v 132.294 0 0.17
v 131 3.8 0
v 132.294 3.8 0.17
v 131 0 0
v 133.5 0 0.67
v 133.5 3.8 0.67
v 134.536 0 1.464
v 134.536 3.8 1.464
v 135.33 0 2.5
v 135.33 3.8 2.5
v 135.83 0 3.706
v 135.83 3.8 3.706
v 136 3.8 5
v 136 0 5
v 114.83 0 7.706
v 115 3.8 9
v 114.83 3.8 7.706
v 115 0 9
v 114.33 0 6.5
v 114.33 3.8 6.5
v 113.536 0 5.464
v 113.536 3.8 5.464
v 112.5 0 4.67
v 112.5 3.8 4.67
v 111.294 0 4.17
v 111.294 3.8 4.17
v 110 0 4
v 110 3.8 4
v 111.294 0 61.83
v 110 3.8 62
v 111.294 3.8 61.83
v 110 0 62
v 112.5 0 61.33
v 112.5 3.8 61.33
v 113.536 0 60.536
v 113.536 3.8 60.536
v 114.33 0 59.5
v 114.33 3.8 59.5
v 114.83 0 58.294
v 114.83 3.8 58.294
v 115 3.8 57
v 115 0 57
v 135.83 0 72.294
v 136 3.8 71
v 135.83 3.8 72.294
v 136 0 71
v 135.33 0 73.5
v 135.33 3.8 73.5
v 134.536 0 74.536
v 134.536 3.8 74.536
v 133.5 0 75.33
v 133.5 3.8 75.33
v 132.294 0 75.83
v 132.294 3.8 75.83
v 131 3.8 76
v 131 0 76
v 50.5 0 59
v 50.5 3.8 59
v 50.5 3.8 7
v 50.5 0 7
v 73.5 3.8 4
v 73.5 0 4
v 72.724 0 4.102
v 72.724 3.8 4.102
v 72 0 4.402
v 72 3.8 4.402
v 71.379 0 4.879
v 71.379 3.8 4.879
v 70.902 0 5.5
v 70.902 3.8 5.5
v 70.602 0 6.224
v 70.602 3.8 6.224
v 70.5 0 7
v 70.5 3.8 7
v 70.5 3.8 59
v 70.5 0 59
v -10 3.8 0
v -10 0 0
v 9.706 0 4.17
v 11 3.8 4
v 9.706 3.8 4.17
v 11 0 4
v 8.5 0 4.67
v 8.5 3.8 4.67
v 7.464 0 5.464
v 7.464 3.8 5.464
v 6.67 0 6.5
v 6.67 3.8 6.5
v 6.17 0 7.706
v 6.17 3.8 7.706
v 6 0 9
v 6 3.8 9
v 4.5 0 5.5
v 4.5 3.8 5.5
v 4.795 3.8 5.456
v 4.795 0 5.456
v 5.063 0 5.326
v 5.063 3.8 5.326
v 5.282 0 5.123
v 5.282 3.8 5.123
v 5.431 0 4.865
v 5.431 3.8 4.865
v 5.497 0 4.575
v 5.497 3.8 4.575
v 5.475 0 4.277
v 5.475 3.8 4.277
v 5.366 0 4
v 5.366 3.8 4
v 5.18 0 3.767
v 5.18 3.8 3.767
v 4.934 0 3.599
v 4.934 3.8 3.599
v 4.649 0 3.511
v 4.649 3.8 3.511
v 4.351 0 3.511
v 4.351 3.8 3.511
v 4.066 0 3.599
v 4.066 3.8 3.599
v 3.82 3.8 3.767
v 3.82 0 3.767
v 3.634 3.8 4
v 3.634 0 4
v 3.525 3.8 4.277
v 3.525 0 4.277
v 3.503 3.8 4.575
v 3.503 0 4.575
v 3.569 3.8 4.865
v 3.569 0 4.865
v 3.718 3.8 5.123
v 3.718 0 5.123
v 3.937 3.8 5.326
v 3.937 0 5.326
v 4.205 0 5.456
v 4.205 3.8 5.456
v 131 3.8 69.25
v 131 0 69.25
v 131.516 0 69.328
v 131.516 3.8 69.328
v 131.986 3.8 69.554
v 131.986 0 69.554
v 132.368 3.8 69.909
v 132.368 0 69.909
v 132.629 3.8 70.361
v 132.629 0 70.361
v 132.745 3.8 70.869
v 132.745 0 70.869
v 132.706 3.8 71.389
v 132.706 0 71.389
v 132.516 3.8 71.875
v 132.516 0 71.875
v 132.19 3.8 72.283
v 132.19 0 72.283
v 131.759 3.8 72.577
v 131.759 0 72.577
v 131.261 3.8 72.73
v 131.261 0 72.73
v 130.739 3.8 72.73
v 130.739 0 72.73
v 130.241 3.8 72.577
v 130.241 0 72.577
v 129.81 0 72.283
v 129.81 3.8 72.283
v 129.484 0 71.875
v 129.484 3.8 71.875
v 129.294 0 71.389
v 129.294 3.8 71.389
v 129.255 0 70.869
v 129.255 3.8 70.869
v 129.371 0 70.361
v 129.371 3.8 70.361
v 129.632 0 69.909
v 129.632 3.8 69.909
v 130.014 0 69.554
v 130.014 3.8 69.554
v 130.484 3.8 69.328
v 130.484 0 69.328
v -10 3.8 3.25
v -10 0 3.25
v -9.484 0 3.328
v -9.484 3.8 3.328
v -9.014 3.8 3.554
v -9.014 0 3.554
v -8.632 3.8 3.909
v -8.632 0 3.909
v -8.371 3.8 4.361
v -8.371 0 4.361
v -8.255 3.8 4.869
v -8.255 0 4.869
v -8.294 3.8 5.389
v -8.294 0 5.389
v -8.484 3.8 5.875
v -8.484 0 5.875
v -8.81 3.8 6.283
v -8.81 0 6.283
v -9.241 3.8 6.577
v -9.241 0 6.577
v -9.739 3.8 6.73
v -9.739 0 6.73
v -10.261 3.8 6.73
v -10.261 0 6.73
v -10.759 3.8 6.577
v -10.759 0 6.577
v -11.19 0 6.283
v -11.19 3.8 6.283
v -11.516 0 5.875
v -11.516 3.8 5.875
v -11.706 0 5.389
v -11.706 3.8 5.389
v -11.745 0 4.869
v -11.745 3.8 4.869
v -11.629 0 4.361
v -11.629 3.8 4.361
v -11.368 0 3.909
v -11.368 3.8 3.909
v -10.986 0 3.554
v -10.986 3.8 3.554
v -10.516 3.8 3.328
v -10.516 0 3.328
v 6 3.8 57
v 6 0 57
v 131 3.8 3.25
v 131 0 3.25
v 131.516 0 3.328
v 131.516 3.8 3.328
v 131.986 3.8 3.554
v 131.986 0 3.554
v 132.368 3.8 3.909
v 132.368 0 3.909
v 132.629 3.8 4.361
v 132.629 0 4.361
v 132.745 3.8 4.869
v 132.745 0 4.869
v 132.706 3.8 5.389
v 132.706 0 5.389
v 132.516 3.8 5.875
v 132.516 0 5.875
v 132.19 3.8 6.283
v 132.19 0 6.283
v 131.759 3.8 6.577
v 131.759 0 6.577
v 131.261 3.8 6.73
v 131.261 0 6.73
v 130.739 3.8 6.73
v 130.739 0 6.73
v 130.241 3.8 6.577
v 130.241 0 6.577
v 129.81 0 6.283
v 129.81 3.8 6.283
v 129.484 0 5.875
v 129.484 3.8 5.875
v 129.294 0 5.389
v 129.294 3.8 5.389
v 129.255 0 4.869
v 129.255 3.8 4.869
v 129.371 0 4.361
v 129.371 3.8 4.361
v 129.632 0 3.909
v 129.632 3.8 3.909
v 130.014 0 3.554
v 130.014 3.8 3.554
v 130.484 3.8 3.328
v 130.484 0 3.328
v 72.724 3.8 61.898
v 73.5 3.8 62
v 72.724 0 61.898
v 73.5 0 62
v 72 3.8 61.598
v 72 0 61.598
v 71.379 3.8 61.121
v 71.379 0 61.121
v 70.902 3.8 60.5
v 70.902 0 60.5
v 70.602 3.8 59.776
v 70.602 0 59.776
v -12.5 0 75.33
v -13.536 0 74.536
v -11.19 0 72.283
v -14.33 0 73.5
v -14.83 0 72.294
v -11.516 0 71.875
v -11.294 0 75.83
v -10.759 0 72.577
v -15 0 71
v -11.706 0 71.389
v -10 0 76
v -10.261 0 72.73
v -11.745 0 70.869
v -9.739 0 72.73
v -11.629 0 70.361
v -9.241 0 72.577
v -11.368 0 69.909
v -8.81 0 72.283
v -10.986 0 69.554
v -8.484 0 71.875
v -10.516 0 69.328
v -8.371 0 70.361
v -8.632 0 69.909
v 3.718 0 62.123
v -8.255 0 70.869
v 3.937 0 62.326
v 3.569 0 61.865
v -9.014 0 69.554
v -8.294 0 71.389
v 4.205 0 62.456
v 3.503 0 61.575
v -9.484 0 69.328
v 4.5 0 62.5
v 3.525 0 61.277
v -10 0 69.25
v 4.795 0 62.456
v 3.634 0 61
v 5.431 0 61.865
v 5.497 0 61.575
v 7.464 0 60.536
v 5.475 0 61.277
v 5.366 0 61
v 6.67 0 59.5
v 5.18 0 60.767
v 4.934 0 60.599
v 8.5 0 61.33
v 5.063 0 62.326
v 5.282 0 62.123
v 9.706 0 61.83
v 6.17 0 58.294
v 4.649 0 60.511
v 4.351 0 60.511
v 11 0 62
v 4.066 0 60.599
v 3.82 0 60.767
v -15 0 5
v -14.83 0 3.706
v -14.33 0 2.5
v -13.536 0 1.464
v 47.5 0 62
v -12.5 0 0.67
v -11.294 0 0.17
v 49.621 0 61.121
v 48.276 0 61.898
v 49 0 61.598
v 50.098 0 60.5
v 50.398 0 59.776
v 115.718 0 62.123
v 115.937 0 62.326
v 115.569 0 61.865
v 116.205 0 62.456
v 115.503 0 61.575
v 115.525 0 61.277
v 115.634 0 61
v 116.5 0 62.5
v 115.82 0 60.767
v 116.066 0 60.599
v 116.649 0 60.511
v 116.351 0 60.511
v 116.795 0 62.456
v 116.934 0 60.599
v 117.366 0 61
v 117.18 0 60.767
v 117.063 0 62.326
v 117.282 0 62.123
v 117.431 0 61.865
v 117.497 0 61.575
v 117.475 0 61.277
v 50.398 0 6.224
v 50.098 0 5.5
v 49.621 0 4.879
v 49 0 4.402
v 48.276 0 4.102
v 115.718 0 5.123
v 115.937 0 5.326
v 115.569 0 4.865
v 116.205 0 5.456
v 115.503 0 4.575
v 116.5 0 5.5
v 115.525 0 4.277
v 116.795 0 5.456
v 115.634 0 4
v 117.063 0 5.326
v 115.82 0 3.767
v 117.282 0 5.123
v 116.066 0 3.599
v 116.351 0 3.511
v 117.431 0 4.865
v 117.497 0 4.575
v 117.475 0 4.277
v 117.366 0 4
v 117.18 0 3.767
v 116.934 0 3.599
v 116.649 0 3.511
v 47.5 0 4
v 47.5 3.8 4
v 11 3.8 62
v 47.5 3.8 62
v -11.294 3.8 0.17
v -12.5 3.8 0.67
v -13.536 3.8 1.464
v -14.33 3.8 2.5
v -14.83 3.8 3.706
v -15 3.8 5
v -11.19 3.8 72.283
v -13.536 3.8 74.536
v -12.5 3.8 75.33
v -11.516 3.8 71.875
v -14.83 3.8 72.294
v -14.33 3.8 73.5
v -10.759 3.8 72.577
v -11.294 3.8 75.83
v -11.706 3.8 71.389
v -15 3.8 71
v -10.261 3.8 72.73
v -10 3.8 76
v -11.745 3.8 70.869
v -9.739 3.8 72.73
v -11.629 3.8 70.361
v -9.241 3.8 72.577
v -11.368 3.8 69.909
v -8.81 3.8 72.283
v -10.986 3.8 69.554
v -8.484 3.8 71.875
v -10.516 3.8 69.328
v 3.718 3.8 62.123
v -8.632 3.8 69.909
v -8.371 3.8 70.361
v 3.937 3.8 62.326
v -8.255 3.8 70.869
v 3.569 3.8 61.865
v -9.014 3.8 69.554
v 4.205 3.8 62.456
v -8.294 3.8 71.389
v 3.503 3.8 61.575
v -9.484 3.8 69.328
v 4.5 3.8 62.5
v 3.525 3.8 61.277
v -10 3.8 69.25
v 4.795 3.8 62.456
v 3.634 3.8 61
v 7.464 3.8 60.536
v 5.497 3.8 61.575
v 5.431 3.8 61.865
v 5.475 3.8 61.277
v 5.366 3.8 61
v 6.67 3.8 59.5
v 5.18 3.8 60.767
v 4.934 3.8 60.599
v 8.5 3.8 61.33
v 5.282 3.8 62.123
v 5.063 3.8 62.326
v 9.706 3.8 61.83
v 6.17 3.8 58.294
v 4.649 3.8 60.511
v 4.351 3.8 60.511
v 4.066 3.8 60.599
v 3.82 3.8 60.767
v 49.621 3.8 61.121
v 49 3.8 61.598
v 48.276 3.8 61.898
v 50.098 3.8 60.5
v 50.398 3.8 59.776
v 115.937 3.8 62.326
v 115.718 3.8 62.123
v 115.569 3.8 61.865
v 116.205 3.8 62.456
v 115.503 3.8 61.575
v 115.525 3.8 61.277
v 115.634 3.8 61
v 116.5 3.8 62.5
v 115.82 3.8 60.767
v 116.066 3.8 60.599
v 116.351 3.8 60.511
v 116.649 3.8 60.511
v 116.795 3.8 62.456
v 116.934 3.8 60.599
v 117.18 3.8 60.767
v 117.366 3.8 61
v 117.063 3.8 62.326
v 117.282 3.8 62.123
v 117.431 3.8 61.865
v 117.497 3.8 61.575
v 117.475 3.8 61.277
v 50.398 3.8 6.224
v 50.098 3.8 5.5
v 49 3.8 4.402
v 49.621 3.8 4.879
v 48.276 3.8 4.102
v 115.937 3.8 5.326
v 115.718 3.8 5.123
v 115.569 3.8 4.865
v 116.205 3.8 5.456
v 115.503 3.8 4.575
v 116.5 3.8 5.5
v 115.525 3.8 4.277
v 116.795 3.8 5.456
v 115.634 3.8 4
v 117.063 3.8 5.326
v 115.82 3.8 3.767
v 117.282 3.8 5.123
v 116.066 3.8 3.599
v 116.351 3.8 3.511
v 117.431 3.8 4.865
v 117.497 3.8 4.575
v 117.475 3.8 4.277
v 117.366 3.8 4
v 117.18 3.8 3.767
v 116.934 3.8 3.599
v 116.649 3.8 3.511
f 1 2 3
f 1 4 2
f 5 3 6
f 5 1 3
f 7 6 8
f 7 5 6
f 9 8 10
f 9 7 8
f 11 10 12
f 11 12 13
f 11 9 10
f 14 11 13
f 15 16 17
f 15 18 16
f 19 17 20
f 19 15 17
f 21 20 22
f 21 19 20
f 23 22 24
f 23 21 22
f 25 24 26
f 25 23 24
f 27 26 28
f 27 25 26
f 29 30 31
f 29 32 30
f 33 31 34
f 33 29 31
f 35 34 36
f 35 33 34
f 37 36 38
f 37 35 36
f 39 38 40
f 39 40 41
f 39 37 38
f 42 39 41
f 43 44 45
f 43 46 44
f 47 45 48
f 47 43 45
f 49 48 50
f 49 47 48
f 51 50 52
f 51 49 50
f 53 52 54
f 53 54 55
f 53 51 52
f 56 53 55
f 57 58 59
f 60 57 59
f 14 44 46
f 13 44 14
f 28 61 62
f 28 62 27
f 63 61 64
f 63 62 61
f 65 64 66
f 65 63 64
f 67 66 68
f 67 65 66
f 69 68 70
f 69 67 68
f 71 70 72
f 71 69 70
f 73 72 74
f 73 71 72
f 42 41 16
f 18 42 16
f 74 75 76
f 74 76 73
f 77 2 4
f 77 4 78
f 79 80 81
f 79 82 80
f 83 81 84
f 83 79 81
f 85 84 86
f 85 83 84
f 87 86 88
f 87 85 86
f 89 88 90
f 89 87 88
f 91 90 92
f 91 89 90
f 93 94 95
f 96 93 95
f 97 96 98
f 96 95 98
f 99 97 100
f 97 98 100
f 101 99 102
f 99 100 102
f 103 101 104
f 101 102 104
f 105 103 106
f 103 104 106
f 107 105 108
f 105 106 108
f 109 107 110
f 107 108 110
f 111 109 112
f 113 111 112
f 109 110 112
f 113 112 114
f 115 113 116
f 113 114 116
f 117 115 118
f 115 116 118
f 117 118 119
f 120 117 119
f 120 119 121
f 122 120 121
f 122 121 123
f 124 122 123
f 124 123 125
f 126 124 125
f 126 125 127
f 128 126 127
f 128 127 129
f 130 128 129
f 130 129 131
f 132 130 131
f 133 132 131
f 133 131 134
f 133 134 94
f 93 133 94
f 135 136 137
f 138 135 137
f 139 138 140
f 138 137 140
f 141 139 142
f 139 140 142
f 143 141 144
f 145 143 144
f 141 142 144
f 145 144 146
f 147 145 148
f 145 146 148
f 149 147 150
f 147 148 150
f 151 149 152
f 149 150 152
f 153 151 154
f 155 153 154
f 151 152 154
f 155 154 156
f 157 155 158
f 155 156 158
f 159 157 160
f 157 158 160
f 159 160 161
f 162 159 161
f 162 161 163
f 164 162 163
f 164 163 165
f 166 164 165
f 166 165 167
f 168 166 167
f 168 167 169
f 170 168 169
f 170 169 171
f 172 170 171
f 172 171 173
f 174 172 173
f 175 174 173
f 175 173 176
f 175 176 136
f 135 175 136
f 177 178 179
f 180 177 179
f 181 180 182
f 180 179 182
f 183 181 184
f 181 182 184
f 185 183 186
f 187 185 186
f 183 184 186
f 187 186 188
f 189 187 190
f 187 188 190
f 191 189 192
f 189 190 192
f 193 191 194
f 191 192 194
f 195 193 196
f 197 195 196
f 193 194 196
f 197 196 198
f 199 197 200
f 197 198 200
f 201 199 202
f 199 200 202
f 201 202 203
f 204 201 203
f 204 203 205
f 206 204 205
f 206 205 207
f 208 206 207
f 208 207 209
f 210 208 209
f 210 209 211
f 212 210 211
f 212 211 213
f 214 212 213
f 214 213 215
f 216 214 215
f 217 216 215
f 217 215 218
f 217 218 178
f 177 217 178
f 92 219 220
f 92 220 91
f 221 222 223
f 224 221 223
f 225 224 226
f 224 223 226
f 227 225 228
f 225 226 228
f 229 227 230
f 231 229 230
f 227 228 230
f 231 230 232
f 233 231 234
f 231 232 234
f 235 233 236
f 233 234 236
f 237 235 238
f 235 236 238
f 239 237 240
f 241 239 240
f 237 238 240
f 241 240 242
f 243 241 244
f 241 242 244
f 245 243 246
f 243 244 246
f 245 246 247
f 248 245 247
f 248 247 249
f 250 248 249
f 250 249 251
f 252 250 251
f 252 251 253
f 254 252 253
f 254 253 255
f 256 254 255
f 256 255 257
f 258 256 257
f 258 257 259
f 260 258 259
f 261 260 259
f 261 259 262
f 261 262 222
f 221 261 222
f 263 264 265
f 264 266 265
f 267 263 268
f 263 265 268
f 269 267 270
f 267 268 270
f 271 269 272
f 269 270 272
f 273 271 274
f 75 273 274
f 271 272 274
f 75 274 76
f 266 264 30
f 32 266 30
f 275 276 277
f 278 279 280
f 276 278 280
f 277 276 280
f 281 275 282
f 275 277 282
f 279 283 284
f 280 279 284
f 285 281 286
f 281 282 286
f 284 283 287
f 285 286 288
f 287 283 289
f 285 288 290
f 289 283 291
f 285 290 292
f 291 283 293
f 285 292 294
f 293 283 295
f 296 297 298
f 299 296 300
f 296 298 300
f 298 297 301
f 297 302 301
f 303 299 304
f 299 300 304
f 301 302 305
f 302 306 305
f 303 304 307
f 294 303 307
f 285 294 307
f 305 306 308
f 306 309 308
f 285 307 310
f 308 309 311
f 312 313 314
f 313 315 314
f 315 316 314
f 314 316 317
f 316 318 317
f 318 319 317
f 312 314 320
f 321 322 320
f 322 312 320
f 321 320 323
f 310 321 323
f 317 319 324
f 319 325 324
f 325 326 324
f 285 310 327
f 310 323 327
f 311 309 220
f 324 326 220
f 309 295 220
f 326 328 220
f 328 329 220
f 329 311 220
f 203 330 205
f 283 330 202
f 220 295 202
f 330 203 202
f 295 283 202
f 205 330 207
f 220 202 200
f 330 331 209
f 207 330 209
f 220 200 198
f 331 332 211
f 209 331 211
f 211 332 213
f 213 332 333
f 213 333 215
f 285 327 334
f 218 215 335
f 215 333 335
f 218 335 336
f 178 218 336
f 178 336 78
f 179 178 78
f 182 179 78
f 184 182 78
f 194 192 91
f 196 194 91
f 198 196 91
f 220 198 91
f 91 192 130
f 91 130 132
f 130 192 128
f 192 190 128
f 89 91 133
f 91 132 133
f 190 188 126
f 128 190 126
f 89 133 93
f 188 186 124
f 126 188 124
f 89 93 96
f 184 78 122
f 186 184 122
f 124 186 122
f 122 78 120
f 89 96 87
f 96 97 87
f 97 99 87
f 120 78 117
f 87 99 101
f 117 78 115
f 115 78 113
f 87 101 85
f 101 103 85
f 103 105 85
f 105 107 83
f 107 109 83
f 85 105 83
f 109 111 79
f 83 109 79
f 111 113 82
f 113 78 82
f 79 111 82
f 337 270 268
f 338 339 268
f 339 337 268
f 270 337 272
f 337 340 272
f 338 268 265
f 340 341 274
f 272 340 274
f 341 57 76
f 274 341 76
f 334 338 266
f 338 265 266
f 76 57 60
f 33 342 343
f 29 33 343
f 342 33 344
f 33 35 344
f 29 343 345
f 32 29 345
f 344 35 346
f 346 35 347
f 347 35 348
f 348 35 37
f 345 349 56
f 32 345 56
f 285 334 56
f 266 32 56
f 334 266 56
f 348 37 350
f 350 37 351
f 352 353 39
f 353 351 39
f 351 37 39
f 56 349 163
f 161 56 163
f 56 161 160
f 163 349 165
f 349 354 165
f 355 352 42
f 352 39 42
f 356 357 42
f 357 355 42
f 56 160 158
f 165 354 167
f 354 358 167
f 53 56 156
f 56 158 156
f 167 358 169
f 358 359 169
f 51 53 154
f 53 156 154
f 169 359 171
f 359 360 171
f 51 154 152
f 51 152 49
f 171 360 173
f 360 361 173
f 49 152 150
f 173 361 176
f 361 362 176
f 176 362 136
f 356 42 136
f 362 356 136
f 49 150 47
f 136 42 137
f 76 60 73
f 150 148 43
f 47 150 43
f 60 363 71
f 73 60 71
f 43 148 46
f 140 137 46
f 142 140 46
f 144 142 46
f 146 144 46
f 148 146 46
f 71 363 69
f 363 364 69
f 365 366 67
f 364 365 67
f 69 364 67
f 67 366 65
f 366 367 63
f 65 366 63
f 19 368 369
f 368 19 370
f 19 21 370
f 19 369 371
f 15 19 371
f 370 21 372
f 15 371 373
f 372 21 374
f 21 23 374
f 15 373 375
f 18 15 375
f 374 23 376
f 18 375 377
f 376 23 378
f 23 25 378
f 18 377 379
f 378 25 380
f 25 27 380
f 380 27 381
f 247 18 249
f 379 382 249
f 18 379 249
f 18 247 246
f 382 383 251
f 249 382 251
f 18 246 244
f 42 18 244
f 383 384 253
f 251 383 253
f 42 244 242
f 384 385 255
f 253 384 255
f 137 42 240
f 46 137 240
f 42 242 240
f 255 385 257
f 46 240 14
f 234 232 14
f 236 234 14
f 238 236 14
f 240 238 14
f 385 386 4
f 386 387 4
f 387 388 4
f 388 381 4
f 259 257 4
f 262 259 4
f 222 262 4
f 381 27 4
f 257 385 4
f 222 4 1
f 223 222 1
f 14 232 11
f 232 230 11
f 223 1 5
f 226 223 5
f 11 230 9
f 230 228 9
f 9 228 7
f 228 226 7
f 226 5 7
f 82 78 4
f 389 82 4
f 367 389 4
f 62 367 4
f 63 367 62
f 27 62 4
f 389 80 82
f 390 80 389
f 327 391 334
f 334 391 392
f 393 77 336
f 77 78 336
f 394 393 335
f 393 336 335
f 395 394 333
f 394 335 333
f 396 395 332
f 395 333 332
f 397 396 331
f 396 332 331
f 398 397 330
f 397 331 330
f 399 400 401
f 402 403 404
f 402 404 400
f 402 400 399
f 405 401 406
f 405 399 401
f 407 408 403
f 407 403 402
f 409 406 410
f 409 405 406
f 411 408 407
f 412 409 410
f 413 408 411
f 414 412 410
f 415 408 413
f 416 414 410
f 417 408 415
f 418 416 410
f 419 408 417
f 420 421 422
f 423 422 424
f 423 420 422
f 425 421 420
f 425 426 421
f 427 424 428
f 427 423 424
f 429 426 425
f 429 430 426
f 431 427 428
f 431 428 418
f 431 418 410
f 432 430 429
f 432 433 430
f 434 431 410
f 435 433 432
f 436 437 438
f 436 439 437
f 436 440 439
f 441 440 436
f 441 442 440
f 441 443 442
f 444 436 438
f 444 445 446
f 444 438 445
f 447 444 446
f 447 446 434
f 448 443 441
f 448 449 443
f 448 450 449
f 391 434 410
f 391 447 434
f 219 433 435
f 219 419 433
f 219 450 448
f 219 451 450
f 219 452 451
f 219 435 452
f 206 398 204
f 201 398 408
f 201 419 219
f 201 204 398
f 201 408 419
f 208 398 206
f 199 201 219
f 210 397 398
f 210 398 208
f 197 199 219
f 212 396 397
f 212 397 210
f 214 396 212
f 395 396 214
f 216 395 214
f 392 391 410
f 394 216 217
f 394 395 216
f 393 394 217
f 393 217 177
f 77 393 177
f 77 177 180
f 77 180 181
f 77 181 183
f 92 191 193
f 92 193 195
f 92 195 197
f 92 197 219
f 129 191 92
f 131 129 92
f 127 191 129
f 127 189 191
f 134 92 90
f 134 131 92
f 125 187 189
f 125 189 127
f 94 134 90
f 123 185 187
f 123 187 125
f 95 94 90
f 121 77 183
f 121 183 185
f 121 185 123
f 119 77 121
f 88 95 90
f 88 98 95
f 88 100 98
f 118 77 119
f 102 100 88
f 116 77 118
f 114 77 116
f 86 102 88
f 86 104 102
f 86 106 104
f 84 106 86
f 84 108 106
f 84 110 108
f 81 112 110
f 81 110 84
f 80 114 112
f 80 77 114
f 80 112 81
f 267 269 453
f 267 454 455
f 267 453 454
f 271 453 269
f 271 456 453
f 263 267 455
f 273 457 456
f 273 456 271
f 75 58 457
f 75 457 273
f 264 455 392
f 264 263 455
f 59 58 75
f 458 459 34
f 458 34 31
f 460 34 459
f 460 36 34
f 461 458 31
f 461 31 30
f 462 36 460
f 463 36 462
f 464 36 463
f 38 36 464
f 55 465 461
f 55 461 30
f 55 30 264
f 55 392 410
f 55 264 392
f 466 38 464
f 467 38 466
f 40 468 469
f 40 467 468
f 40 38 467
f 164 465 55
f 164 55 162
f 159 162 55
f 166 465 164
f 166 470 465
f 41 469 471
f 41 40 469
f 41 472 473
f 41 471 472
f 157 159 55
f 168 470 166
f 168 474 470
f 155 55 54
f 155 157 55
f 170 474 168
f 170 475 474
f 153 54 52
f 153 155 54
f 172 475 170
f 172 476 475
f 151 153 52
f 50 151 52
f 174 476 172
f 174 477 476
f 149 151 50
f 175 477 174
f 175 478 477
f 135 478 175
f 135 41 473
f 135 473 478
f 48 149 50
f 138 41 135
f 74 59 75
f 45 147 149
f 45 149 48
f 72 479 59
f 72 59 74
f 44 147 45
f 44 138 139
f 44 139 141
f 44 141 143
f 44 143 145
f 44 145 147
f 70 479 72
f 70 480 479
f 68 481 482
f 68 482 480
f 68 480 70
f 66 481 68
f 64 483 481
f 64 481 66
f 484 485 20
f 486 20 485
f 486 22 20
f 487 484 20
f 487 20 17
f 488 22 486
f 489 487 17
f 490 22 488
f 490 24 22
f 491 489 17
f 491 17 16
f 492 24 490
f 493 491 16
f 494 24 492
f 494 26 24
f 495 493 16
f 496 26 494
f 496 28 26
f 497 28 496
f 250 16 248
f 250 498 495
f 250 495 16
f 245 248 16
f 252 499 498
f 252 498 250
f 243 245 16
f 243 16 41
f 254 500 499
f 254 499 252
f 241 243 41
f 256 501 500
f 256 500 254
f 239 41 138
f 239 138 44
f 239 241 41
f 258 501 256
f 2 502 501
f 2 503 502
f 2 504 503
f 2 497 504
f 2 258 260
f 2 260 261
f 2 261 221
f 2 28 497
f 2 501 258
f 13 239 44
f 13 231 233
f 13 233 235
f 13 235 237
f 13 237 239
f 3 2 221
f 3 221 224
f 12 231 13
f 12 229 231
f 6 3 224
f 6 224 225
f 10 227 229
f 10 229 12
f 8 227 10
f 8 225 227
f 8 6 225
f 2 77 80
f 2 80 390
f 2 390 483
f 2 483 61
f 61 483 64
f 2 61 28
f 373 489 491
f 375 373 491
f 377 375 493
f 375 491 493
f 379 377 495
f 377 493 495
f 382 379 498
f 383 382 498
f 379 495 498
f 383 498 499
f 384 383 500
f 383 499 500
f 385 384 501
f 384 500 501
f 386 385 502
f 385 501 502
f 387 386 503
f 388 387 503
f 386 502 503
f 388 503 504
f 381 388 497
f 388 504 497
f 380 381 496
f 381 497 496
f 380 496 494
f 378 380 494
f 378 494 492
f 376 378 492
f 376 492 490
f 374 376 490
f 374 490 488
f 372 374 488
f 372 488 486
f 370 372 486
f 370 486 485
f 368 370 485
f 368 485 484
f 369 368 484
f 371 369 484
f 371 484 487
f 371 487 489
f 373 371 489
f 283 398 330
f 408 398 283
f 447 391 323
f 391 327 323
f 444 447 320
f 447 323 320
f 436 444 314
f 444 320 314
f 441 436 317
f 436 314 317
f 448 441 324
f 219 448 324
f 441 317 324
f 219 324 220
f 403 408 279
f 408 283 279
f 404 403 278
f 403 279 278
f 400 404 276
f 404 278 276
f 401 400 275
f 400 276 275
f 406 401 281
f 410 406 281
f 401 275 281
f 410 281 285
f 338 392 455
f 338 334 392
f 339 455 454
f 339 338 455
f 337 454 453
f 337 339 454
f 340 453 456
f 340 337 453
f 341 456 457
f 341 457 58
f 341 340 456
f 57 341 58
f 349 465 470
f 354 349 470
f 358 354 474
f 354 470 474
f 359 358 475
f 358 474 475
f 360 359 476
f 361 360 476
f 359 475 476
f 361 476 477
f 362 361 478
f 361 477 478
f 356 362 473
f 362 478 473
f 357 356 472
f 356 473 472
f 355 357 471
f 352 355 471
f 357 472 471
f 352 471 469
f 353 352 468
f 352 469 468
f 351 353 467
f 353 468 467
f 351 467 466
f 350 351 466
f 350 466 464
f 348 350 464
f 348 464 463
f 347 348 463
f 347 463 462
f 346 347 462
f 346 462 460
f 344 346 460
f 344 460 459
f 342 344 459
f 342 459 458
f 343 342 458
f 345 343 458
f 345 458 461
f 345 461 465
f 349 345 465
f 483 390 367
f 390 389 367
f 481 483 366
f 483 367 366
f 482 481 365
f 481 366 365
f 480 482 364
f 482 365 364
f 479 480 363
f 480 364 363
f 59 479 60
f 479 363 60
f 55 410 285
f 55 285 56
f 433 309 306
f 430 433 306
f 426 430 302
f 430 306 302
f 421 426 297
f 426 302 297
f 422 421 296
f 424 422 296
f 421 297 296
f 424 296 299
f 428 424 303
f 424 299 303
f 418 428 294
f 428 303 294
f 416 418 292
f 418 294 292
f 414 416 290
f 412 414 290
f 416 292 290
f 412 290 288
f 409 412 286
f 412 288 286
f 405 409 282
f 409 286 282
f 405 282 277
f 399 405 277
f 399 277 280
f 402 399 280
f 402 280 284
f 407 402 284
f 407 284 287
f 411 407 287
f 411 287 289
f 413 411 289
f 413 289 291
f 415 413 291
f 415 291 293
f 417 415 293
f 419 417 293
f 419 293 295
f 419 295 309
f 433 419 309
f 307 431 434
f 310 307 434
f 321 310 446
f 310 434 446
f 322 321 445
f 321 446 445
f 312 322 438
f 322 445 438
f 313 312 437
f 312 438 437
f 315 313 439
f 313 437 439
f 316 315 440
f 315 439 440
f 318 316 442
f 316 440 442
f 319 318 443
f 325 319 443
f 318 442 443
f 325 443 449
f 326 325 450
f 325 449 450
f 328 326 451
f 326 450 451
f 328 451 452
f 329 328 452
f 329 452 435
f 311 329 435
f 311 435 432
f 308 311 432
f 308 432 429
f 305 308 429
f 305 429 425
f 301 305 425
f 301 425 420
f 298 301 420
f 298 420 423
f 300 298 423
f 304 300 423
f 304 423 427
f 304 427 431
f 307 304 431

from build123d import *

# Parameters (mm, degrees)
SKETCH1_W           = 121
SKETCH1_H           = 66
BOSS_EXTRUDE1_DEPTH = 3.8
SKETCH2_W           = 109
SKETCH2_H           = 58
CUT_EXTRUDE1_DEPTH  = 138.881978518
FILLET1_R           = 5
SKETCH3_W           = 20
SKETCH3_H           = 58
BOSS_EXTRUDE2_DEPTH = 3.8
FILLET2_R           = 3
SKETCH4_R           = 1
CUT_EXTRUDE2_DEPTH  = 138.881978518
BOSS_EXTRUDE3_DEPTH = 3.8
SKETCH6_R           = 1.75
CUT_EXTRUDE3_DEPTH  = 156.841072892
FILLET3_R           = 5


with BuildPart() as part:
    # Sketch1 → Boss-Extrude1 (new body)
    with BuildSketch(Plane(origin=(0, 0, 0), x_dir=(1, 0, 0), z_dir=(0, 1, 0))):
        with Locations((60.5, -33)):
            Rectangle(SKETCH1_W, SKETCH1_H)
    extrude(amount=BOSS_EXTRUDE1_DEPTH)

    # Sketch2 → Cut-Extrude1 (cut, through all)
    with BuildSketch(Plane(origin=(0, 3.8, 0), x_dir=(1, 0, 0), z_dir=(0, 1, 0))):
        with Locations((60.5, -33)):
            Rectangle(SKETCH2_W, SKETCH2_H)
    extrude(amount=-CUT_EXTRUDE1_DEPTH, mode=Mode.SUBTRACT)

    # Fillet1
    fillet1_edges = [part.edges().sort_by_distance(p)[0] for p in [
        (115, 1.9, 4),
        (115, 1.9, 62),
        (6, 1.9, 62),
        (6, 1.9, 4),
    ]]
    fillet(fillet1_edges, radius=FILLET1_R)

    # Sketch3 → Boss-Extrude2 (add, through all)
    with BuildSketch(Plane(origin=(0, 3.8, 0), x_dir=(1, 0, 0), z_dir=(0, 1, 0))):
        with Locations((60.5, -33)):
            Rectangle(SKETCH3_W, SKETCH3_H)
    extrude(amount=-BOSS_EXTRUDE2_DEPTH)

    # Fillet2
    fillet2_edges = [part.edges().sort_by_distance(p)[0] for p in [
        (70.5, 1.9, 4),
        (70.5, 1.9, 62),
        (50.5, 1.9, 62),
        (50.5, 1.9, 4),
    ]]
    fillet(fillet2_edges, radius=FILLET2_R)

    # Sketch4 → Cut-Extrude2 (cut, through all)
    with BuildSketch(Plane(origin=(0, 3.8, 0), x_dir=(1, 0, 0), z_dir=(0, 1, 0))):
        with Locations(Location((116.5, -61.5, 0), (0, 0, 270))):
            Circle(SKETCH4_R)
        with Locations(Location((116.5, -4.5, 0), (0, 0, 270))):
            Circle(SKETCH4_R)
        with Locations(Location((4.5, -4.5, 0), (0, 0, 270))):
            Circle(SKETCH4_R)
        with Locations(Location((4.5, -61.5, 0), (0, 0, 270))):
            Circle(SKETCH4_R)
    extrude(amount=-CUT_EXTRUDE2_DEPTH, mode=Mode.SUBTRACT)

    # Sketch5 → Boss-Extrude3 (add, through all)
    with BuildSketch(Plane(origin=(0, 3.8, 0), x_dir=(1, 0, 0), z_dir=(0, 1, 0))):
        Polygon((0, 0), (-15, 0), (-15, -76), (136, -76), (136, 0), (121, 0), (121, -66), (0, -66), align=None)
    extrude(amount=-BOSS_EXTRUDE3_DEPTH)

    # Sketch6 → Cut-Extrude3 (cut, through all)
    with BuildSketch(Plane(origin=(0, 0, 0), x_dir=(-1, 0, 0), z_dir=(0, -1, 0))):
        with Locations(Location((10, -71, 0), (0, 0, 90))):
            Circle(SKETCH6_R)
        with Locations(Location((10, -5, 0), (0, 0, 90))):
            Circle(SKETCH6_R)
        with Locations(Location((-131, -71, 0), (0, 0, 90))):
            Circle(SKETCH6_R)
        with Locations(Location((-131, -5, 0), (0, 0, 90))):
            Circle(SKETCH6_R)
    extrude(amount=-CUT_EXTRUDE3_DEPTH, mode=Mode.SUBTRACT)

    # Fillet3
    fillet3_edges = [part.edges().sort_by_distance(p)[0] for p in [
        (136, 1.9, 0),
        (136, 1.9, 76),
        (-15, 1.9, 76),
        (-15, 1.9, 0),
    ]]
    fillet(fillet3_edges, radius=FILLET3_R)


solid = part.part
